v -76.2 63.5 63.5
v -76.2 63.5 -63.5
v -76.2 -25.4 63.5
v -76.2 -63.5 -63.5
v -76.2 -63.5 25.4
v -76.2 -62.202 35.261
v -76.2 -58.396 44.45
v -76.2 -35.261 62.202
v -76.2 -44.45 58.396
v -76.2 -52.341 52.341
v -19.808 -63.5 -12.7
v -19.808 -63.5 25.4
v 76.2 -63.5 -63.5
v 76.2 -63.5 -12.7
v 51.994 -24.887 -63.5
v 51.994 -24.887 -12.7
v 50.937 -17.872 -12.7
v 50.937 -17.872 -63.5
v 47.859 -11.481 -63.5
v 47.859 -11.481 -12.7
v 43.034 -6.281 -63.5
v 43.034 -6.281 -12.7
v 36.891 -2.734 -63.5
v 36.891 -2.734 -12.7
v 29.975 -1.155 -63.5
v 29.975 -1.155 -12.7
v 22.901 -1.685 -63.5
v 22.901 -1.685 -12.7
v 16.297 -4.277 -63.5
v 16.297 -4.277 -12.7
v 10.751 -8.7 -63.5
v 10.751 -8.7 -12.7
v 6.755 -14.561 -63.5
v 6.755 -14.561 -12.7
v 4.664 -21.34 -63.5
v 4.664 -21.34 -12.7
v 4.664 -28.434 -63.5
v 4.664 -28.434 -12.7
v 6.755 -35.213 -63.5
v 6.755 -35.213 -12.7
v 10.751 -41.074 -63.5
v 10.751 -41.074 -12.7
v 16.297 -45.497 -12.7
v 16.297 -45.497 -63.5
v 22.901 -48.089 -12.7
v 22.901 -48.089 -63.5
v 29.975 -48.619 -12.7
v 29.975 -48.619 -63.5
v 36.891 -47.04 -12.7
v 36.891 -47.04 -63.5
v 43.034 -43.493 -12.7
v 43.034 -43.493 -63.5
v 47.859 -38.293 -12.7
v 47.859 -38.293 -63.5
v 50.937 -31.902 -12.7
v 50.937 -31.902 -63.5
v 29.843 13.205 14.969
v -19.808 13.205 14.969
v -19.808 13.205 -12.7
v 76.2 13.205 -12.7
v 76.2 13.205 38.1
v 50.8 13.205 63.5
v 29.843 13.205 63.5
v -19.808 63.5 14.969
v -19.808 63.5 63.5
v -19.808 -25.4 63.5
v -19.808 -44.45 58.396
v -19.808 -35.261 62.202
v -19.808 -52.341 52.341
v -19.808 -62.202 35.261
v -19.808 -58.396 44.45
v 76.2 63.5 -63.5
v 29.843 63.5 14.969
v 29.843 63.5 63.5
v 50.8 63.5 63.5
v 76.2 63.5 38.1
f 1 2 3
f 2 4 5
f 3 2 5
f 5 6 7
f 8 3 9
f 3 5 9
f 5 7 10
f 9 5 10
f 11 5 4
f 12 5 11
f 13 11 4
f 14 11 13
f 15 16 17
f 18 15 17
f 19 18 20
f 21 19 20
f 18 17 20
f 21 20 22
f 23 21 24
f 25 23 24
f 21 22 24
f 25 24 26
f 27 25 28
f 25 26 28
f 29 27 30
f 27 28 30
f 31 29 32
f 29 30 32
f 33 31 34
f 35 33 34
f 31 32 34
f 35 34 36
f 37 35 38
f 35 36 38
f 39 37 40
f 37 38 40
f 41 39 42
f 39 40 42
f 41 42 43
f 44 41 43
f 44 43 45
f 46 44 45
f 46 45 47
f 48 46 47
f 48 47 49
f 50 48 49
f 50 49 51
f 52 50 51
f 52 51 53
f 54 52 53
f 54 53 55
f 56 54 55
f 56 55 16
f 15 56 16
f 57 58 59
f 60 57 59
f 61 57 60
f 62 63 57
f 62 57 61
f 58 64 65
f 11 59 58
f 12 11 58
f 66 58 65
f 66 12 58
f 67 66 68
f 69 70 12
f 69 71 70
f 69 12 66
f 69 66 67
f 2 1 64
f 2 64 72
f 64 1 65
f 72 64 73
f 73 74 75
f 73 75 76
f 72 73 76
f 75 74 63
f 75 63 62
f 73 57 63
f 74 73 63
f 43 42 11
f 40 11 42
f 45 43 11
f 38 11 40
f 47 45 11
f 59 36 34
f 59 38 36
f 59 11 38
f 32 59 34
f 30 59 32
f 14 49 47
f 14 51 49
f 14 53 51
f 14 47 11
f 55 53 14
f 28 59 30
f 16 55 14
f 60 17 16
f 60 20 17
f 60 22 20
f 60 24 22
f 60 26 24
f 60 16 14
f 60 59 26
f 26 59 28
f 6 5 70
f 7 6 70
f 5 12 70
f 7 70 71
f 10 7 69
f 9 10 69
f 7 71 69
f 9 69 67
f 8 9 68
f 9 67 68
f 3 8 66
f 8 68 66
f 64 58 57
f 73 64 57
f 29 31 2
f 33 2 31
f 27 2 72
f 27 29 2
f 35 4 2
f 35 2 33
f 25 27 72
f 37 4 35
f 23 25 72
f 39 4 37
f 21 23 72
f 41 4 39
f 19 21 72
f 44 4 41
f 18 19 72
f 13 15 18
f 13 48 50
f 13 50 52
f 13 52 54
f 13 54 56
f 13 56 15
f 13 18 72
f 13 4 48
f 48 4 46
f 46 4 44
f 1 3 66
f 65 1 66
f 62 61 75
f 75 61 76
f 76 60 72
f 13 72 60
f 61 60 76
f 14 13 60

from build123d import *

# Parameters (mm, degrees)
F0_W     = 152.4
F0_H     = 127
F1_DEPTH = 63.5
F2_W     = 96.0077429086
F2_H     = 76.7051585242
F3_DEPTH = 76.2
F4_W     = 49.6507994831
F4_H     = 48.5305104628
F5_DEPTH = 75.184
F6_R     = 38.1
F7_SIZE  = 25.4
F8_R     = 23.7983401661
F9_DEPTH = 86.36


with BuildPart() as f1:
    # F0 (on Front) → F1 (new body, symmetric)
    with BuildSketch(Plane.XZ):
        Rectangle(F0_W, F0_H)
    extrude(amount=F1_DEPTH, both=True)

    # F2 (on face) → F3 (cut)
    with BuildSketch(Plane.XY.offset(63.5)):
        with Locations((28.1961285457, -25.1474207379)):
            Rectangle(F2_W, F2_H)
    extrude(amount=-F3_DEPTH, mode=Mode.SUBTRACT)

    # F4 (on face) → F5 (cut)
    with BuildSketch(Plane.XZ.offset(-13.2051585242)):
        with Locations((5.0176568329, 39.2347447686)):
            Rectangle(F4_W, F4_H)
    extrude(amount=-F5_DEPTH, mode=Mode.SUBTRACT)

    # F6
    f6_edges = [f1.edges().sort_by_distance(p)[0] for p in [
        (-48.003871, -63.5, 63.5),
    ]]
    fillet(f6_edges, radius=F6_R)

    # F7
    f7_edges = [f1.edges().sort_by_distance(p)[0] for p in [
        (76.2, 38.352579, 63.5),
    ]]
    chamfer(f7_edges, length=F7_SIZE)

    # F8 (on face) → F9 (cut)
    with BuildSketch(Plane.XY.offset(-12.7)):
        with Locations((28.1961299479, -24.8870439827)):
            Circle(F8_R)
    extrude(amount=-F9_DEPTH, mode=Mode.SUBTRACT)


solid = f1.part
